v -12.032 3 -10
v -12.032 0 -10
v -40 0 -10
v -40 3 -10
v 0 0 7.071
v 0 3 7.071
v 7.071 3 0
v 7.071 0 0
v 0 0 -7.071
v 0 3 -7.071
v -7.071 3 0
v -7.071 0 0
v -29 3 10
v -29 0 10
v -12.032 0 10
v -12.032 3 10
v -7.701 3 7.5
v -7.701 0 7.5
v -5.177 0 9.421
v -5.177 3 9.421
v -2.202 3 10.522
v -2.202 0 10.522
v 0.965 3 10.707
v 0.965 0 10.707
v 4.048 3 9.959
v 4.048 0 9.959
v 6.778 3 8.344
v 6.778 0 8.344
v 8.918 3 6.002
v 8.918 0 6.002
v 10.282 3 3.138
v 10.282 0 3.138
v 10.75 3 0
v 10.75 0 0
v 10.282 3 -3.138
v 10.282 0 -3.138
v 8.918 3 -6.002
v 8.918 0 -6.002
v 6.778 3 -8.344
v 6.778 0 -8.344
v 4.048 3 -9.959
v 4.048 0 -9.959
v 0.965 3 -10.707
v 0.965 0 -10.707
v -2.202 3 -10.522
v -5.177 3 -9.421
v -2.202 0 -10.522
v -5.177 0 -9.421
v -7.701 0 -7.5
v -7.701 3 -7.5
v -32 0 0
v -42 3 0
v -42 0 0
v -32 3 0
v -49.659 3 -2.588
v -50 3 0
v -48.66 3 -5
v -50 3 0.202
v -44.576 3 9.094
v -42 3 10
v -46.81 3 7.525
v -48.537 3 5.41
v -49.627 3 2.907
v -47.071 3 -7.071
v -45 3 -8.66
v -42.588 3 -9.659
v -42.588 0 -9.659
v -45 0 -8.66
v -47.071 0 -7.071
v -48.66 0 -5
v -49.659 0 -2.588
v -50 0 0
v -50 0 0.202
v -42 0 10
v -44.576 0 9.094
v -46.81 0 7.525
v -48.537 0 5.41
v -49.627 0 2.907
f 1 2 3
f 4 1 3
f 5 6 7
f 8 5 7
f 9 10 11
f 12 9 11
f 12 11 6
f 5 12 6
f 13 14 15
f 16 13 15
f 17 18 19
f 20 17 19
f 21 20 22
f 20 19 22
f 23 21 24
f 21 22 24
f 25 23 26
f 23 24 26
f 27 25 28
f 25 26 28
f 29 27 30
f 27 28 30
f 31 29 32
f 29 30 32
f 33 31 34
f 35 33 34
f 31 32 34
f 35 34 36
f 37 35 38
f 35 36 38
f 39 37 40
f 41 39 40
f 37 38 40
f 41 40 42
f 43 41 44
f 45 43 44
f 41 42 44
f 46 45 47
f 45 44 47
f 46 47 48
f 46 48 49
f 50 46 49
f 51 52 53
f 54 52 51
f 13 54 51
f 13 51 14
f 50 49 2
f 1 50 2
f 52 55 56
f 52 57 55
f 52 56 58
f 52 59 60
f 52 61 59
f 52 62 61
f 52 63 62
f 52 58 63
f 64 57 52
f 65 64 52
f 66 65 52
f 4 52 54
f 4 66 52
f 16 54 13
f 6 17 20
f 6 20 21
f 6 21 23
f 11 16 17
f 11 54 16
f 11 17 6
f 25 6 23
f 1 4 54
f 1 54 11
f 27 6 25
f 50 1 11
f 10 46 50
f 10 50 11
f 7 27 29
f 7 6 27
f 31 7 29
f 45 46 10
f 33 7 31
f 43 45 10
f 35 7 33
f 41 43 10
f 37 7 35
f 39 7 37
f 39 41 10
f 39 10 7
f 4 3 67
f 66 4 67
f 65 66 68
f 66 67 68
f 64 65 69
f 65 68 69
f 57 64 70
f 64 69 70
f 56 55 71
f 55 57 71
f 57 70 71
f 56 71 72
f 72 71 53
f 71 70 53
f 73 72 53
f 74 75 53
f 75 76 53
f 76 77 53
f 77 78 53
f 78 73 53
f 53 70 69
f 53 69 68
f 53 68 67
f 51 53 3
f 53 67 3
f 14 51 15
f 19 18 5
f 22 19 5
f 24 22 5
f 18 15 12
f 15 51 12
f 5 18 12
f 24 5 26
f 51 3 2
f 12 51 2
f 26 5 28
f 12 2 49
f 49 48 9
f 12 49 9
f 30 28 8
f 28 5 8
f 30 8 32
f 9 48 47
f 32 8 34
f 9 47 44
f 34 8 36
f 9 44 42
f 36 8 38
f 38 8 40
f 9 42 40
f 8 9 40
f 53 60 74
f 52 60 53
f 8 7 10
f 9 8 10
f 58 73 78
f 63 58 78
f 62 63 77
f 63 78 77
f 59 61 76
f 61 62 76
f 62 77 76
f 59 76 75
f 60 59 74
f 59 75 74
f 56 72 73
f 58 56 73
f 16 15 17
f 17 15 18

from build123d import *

# Parameters (mm, degrees)
EXTRUDE_1_DEPTH     = 3
CUT_EXTRUDE_1_DEPTH = 52.230484089
CUT_EXTRUDE_3_DEPTH = 10
FILLET_1_R          = 10


with BuildPart() as part:
    # 草图2 → 凸台-拉伸1 (new body)
    with BuildSketch(Plane(origin=(0, 0, 0), x_dir=(1, 0, 0), z_dir=(0, 1, 0))):
        with BuildLine():
            Line((-12.031587919, -10), (-7.7014609, -7.5))
            ThreePointArc((-7.7014609, -7.5), (10.75, 0), (-7.7014609, 7.5))
            Line((-7.7014609, 7.5), (-12.031587919, 10))
            Line((-12.031587919, 10), (-50, 10))
            Line((-50, 10), (-50, -10))
            Line((-50, -10), (-12.031587919, -10))
        make_face()
    extrude(amount=EXTRUDE_1_DEPTH)

    # 草图3 → 切除-拉伸1 (cut, through all)
    with BuildSketch(Plane(origin=(0, 3, 0), x_dir=(1, 0, 0), z_dir=(0, 1, 0))):
        Polygon((0, 7.071067812), (-7.071067812, 0), (0, -7.071067812), (7.071067812, 0), align=None)
    extrude(amount=-CUT_EXTRUDE_1_DEPTH, mode=Mode.SUBTRACT)

    # 草图5 → 切除-拉伸3 (cut)
    with BuildSketch(Plane(origin=(0, 3, 0), x_dir=(1, 0, 0), z_dir=(0, 1, 0))):
        Polygon((-42, -10), (-42, 0), (-32, 0), (-29, -10), align=None)
    extrude(amount=-CUT_EXTRUDE_3_DEPTH, mode=Mode.SUBTRACT)

    # 圆角1
    # the kernel refuses this fillet: 10 mm, written as the material it takes off along each edge
    with BuildSketch(Plane(origin=(-50, -25, -10), x_dir=(0, 0, 1), z_dir=(0, 1, 0))) as fillet_1_piece_1:
        with BuildLine():
            CenterArc((FILLET_1_R, FILLET_1_R), FILLET_1_R, 180, 90)
            Line((0, FILLET_1_R), (-FILLET_1_R * 0.02, FILLET_1_R))
            Line((-FILLET_1_R * 0.02, FILLET_1_R), (-FILLET_1_R * 0.02, -FILLET_1_R * 0.02))
            Line((-FILLET_1_R * 0.02, -FILLET_1_R * 0.02), (FILLET_1_R, -FILLET_1_R * 0.02))
            Line((FILLET_1_R, -FILLET_1_R * 0.02), (FILLET_1_R, 0))
        make_face()
    extrude(amount=53, mode=Mode.SUBTRACT)
    with BuildSketch(Plane(origin=(-50, -24.494897428, 10), x_dir=(1, 0, 0), z_dir=(0, 1, 0))) as fillet_1_piece_2:
        with BuildLine():
            CenterArc((10, 9.797958971), FILLET_1_R, 180, 78.463040967)
            Line((0, 9.797958971), (-0.2, 9.797958971))
            Line((-0.2, 9.797958971), (-0.2, 0))
            Line((-0.2, 0), (0, -0.2))
            ThreePointArc((0, -0.2), (4, -0.2), (7.96, -0.195959179))
            Line((7.96, -0.195959179), (8, 0))
        make_face()
    extrude(amount=51.989794856, mode=Mode.SUBTRACT)


solid = part.part
